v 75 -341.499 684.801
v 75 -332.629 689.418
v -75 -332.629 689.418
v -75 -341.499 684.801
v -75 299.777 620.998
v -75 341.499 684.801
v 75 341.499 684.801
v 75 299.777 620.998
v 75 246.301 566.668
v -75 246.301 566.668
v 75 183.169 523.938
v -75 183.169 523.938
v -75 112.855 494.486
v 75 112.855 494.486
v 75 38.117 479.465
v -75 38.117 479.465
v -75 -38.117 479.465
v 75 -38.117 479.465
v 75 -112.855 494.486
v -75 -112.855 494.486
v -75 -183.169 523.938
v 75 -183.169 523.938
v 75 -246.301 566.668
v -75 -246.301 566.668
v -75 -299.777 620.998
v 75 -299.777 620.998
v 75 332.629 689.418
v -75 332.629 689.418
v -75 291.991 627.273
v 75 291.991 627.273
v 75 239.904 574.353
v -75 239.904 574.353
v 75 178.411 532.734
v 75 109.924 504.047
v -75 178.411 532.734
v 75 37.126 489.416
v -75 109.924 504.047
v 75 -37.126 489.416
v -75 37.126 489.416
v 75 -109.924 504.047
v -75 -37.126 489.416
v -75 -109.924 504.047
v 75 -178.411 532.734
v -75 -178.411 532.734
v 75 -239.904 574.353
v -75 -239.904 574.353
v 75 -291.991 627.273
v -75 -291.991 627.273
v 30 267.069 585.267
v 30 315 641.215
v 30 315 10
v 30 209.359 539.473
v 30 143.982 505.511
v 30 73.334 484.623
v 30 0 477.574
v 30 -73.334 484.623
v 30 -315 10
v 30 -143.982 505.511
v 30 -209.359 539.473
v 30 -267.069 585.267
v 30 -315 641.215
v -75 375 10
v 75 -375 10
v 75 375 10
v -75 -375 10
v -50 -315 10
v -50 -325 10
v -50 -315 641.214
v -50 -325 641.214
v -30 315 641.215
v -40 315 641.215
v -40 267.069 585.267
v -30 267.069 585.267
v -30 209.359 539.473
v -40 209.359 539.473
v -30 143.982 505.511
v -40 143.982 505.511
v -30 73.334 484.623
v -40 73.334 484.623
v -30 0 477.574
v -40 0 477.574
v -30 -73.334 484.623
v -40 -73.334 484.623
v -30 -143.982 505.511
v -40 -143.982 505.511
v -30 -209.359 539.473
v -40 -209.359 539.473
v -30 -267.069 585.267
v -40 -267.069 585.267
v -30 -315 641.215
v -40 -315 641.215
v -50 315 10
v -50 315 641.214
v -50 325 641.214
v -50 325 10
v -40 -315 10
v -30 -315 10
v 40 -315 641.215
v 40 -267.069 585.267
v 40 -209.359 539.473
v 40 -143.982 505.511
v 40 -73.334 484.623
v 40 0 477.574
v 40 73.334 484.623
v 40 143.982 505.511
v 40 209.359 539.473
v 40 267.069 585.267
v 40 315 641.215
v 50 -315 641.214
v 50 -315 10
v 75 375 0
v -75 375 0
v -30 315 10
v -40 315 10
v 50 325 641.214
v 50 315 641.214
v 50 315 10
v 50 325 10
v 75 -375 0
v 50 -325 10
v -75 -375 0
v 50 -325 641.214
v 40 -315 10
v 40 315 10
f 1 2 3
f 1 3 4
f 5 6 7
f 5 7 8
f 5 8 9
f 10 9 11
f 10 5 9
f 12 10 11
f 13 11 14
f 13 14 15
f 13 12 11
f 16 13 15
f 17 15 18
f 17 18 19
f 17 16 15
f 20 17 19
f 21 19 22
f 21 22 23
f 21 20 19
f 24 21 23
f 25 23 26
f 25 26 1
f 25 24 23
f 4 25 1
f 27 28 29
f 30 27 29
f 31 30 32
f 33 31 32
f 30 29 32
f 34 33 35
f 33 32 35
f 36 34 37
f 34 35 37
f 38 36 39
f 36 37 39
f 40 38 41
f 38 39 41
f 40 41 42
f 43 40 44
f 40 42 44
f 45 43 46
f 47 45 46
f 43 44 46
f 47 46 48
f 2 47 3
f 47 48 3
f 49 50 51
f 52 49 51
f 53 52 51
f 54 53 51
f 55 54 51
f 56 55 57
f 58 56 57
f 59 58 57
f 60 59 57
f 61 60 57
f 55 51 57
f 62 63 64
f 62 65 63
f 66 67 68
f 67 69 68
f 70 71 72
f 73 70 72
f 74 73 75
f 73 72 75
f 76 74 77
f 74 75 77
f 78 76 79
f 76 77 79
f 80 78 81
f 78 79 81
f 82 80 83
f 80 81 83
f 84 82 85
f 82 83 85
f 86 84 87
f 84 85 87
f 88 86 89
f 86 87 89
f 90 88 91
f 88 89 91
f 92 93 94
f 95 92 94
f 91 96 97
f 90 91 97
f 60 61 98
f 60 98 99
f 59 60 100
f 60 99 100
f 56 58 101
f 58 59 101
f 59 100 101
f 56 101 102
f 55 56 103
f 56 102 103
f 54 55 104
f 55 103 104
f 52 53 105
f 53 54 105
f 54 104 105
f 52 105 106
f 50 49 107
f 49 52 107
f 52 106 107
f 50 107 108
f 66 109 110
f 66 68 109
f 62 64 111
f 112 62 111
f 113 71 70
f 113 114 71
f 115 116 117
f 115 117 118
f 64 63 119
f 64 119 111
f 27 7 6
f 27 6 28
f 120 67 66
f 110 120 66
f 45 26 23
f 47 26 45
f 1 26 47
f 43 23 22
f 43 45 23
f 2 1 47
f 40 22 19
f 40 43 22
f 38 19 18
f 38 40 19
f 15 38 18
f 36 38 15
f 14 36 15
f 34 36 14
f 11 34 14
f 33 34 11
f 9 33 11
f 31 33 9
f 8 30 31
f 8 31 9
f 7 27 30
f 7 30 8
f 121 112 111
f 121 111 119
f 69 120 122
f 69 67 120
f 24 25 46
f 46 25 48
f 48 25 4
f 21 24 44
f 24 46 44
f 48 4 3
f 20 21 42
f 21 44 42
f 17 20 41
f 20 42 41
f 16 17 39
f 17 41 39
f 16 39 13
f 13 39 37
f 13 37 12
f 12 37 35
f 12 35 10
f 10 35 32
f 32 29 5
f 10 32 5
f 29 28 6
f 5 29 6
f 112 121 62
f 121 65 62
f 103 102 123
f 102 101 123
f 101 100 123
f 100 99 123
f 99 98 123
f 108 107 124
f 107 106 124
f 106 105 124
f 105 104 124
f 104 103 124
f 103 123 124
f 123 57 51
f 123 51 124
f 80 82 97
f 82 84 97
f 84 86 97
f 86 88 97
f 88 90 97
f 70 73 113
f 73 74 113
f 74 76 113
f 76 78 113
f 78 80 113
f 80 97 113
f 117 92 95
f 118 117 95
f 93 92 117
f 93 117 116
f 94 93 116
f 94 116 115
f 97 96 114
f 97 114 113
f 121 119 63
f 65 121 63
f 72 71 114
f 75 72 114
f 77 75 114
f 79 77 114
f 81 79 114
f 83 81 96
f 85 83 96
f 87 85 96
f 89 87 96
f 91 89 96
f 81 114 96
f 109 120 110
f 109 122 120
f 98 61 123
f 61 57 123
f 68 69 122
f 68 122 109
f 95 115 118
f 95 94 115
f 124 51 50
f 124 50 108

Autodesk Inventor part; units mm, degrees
ref_plane "YZ Plane" through (0, 0, 0) normal (1, 0, 0) x (0, 1, 0)
ref_plane "XZ Plane" through (0, 0, 0) normal (0, 1, 0) x (-1, 0, 0)
ref_plane "XY Plane" through (0, 0, 0) normal (0, 0, 1) x (1, 0, 0)
sketch "Sketch1" plane through (0, 0, 0) normal (1, 0, 0) x (0, 1, 0)
  line L0 (375, 0) -> (-375, 0)
  line L1 (-375, 0) -> (-375, 10)
  line L2 (-375, 10) -> (375, 10)
  line L3 (375, 10) -> (375, 0)
  line L4 (325, 10) -> (315, 10)
  line L5 (315, 10) -> (315, 641.2145)
  line L6 (315, 641.2145) -> (325, 641.2145)
  line L7 (325, 641.2145) -> (325, 10)
  circle A0 centre (0, 862.574) radius 375
  circle A1 centre (0, 862.574) radius 385
  line L8 (341.4992, 684.8007) -> (332.6291, 689.4182)
  line L9 (-332.6291, 689.4182) -> (-341.4992, 684.8007)
  line L10 (0, 0) -> (0, 862.574)
  circle A2 centre (0, 862.574) radius 375
  line L11 (-100, 10) -> (-100, 275)
  arc A3 (100, 275) -> (-100, 275) centre (0, 275) ccw
  line L12 (100, 275) -> (100, 10)
  line L13 (-90, 10) -> (-90, 275)
  arc A4 (90, 275) -> (-90, 275) centre (0, 275) ccw
  line L14 (90, 275) -> (90, 10)
  line L15 (-100, 10) -> (-90, 10)
  line L16 (90, 10) -> (100, 10)
  dimension "d0" = 750
  dimension "d1" = 10
  dimension "d2" = 750
  dimension "d4" = 10
  dimension "d5" = 10
  dimension "d6" = 50
  dimension "d7" = 125
  dimension "d19" = 750
  dimension "d20" = 100
  dimension "d21" = 265
  dimension "d24" = 10
  dimension "d27" = 0
extrude "Extrusion1" add sketch "Sketch1" along normal mid plane 150 contours L0 L10 L2 L3 | L0 L1 L2 L10
extrude "Extrusion2" add sketch "Sketch1" along normal mid plane 150 separate body contours A1 L10 A0 L8 | A1 L9 A0 L10
extrude "Extrusion3" add sketch "Sketch1" along normal mid plane 100 separate body contours L2 L5 L6 L7
mirror "Mirror1" about plane through (0, 0, 0) normal (0, 1, 0) bodies 3
sketch "Sketch2" plane through (-75, -375, 10) normal (0, 0, 1) x (1, 0, 0)
  line L0 (25, 60) -> (125, 60) projected
  line L1 (25, 690) -> (125, 690) projected
  line L2 (35, 60) -> (45, 60)
  line L3 (45, 60) -> (45, 690)
  line L4 (45, 690) -> (35, 690)
  line L5 (35, 690) -> (35, 60)
  point P0 (75, 375)
  dimension "d14" = 10
  dimension "d15" = 30
extrude "Extrusion4" add sketch "Sketch2" along normal up to next separate body
mirror "Mirror2" about plane through (0, 0, 0) normal (1, 0, 0) bodies 4
extrude "PipeCut" [suppressed]
extrude "PipeCutSup" [suppressed]
equation "\"d4\" = d1"
equation "\"d19\" = Diameter1"
equation "\"d27\" = -0.5 * d2 + 0.5 * d19"
equation "\"d25\" = d12"
equation "\"Diameter1\" = 750"
equation "\"d12\" = 100"
properties part number "Vessel Support" material "Steel"
